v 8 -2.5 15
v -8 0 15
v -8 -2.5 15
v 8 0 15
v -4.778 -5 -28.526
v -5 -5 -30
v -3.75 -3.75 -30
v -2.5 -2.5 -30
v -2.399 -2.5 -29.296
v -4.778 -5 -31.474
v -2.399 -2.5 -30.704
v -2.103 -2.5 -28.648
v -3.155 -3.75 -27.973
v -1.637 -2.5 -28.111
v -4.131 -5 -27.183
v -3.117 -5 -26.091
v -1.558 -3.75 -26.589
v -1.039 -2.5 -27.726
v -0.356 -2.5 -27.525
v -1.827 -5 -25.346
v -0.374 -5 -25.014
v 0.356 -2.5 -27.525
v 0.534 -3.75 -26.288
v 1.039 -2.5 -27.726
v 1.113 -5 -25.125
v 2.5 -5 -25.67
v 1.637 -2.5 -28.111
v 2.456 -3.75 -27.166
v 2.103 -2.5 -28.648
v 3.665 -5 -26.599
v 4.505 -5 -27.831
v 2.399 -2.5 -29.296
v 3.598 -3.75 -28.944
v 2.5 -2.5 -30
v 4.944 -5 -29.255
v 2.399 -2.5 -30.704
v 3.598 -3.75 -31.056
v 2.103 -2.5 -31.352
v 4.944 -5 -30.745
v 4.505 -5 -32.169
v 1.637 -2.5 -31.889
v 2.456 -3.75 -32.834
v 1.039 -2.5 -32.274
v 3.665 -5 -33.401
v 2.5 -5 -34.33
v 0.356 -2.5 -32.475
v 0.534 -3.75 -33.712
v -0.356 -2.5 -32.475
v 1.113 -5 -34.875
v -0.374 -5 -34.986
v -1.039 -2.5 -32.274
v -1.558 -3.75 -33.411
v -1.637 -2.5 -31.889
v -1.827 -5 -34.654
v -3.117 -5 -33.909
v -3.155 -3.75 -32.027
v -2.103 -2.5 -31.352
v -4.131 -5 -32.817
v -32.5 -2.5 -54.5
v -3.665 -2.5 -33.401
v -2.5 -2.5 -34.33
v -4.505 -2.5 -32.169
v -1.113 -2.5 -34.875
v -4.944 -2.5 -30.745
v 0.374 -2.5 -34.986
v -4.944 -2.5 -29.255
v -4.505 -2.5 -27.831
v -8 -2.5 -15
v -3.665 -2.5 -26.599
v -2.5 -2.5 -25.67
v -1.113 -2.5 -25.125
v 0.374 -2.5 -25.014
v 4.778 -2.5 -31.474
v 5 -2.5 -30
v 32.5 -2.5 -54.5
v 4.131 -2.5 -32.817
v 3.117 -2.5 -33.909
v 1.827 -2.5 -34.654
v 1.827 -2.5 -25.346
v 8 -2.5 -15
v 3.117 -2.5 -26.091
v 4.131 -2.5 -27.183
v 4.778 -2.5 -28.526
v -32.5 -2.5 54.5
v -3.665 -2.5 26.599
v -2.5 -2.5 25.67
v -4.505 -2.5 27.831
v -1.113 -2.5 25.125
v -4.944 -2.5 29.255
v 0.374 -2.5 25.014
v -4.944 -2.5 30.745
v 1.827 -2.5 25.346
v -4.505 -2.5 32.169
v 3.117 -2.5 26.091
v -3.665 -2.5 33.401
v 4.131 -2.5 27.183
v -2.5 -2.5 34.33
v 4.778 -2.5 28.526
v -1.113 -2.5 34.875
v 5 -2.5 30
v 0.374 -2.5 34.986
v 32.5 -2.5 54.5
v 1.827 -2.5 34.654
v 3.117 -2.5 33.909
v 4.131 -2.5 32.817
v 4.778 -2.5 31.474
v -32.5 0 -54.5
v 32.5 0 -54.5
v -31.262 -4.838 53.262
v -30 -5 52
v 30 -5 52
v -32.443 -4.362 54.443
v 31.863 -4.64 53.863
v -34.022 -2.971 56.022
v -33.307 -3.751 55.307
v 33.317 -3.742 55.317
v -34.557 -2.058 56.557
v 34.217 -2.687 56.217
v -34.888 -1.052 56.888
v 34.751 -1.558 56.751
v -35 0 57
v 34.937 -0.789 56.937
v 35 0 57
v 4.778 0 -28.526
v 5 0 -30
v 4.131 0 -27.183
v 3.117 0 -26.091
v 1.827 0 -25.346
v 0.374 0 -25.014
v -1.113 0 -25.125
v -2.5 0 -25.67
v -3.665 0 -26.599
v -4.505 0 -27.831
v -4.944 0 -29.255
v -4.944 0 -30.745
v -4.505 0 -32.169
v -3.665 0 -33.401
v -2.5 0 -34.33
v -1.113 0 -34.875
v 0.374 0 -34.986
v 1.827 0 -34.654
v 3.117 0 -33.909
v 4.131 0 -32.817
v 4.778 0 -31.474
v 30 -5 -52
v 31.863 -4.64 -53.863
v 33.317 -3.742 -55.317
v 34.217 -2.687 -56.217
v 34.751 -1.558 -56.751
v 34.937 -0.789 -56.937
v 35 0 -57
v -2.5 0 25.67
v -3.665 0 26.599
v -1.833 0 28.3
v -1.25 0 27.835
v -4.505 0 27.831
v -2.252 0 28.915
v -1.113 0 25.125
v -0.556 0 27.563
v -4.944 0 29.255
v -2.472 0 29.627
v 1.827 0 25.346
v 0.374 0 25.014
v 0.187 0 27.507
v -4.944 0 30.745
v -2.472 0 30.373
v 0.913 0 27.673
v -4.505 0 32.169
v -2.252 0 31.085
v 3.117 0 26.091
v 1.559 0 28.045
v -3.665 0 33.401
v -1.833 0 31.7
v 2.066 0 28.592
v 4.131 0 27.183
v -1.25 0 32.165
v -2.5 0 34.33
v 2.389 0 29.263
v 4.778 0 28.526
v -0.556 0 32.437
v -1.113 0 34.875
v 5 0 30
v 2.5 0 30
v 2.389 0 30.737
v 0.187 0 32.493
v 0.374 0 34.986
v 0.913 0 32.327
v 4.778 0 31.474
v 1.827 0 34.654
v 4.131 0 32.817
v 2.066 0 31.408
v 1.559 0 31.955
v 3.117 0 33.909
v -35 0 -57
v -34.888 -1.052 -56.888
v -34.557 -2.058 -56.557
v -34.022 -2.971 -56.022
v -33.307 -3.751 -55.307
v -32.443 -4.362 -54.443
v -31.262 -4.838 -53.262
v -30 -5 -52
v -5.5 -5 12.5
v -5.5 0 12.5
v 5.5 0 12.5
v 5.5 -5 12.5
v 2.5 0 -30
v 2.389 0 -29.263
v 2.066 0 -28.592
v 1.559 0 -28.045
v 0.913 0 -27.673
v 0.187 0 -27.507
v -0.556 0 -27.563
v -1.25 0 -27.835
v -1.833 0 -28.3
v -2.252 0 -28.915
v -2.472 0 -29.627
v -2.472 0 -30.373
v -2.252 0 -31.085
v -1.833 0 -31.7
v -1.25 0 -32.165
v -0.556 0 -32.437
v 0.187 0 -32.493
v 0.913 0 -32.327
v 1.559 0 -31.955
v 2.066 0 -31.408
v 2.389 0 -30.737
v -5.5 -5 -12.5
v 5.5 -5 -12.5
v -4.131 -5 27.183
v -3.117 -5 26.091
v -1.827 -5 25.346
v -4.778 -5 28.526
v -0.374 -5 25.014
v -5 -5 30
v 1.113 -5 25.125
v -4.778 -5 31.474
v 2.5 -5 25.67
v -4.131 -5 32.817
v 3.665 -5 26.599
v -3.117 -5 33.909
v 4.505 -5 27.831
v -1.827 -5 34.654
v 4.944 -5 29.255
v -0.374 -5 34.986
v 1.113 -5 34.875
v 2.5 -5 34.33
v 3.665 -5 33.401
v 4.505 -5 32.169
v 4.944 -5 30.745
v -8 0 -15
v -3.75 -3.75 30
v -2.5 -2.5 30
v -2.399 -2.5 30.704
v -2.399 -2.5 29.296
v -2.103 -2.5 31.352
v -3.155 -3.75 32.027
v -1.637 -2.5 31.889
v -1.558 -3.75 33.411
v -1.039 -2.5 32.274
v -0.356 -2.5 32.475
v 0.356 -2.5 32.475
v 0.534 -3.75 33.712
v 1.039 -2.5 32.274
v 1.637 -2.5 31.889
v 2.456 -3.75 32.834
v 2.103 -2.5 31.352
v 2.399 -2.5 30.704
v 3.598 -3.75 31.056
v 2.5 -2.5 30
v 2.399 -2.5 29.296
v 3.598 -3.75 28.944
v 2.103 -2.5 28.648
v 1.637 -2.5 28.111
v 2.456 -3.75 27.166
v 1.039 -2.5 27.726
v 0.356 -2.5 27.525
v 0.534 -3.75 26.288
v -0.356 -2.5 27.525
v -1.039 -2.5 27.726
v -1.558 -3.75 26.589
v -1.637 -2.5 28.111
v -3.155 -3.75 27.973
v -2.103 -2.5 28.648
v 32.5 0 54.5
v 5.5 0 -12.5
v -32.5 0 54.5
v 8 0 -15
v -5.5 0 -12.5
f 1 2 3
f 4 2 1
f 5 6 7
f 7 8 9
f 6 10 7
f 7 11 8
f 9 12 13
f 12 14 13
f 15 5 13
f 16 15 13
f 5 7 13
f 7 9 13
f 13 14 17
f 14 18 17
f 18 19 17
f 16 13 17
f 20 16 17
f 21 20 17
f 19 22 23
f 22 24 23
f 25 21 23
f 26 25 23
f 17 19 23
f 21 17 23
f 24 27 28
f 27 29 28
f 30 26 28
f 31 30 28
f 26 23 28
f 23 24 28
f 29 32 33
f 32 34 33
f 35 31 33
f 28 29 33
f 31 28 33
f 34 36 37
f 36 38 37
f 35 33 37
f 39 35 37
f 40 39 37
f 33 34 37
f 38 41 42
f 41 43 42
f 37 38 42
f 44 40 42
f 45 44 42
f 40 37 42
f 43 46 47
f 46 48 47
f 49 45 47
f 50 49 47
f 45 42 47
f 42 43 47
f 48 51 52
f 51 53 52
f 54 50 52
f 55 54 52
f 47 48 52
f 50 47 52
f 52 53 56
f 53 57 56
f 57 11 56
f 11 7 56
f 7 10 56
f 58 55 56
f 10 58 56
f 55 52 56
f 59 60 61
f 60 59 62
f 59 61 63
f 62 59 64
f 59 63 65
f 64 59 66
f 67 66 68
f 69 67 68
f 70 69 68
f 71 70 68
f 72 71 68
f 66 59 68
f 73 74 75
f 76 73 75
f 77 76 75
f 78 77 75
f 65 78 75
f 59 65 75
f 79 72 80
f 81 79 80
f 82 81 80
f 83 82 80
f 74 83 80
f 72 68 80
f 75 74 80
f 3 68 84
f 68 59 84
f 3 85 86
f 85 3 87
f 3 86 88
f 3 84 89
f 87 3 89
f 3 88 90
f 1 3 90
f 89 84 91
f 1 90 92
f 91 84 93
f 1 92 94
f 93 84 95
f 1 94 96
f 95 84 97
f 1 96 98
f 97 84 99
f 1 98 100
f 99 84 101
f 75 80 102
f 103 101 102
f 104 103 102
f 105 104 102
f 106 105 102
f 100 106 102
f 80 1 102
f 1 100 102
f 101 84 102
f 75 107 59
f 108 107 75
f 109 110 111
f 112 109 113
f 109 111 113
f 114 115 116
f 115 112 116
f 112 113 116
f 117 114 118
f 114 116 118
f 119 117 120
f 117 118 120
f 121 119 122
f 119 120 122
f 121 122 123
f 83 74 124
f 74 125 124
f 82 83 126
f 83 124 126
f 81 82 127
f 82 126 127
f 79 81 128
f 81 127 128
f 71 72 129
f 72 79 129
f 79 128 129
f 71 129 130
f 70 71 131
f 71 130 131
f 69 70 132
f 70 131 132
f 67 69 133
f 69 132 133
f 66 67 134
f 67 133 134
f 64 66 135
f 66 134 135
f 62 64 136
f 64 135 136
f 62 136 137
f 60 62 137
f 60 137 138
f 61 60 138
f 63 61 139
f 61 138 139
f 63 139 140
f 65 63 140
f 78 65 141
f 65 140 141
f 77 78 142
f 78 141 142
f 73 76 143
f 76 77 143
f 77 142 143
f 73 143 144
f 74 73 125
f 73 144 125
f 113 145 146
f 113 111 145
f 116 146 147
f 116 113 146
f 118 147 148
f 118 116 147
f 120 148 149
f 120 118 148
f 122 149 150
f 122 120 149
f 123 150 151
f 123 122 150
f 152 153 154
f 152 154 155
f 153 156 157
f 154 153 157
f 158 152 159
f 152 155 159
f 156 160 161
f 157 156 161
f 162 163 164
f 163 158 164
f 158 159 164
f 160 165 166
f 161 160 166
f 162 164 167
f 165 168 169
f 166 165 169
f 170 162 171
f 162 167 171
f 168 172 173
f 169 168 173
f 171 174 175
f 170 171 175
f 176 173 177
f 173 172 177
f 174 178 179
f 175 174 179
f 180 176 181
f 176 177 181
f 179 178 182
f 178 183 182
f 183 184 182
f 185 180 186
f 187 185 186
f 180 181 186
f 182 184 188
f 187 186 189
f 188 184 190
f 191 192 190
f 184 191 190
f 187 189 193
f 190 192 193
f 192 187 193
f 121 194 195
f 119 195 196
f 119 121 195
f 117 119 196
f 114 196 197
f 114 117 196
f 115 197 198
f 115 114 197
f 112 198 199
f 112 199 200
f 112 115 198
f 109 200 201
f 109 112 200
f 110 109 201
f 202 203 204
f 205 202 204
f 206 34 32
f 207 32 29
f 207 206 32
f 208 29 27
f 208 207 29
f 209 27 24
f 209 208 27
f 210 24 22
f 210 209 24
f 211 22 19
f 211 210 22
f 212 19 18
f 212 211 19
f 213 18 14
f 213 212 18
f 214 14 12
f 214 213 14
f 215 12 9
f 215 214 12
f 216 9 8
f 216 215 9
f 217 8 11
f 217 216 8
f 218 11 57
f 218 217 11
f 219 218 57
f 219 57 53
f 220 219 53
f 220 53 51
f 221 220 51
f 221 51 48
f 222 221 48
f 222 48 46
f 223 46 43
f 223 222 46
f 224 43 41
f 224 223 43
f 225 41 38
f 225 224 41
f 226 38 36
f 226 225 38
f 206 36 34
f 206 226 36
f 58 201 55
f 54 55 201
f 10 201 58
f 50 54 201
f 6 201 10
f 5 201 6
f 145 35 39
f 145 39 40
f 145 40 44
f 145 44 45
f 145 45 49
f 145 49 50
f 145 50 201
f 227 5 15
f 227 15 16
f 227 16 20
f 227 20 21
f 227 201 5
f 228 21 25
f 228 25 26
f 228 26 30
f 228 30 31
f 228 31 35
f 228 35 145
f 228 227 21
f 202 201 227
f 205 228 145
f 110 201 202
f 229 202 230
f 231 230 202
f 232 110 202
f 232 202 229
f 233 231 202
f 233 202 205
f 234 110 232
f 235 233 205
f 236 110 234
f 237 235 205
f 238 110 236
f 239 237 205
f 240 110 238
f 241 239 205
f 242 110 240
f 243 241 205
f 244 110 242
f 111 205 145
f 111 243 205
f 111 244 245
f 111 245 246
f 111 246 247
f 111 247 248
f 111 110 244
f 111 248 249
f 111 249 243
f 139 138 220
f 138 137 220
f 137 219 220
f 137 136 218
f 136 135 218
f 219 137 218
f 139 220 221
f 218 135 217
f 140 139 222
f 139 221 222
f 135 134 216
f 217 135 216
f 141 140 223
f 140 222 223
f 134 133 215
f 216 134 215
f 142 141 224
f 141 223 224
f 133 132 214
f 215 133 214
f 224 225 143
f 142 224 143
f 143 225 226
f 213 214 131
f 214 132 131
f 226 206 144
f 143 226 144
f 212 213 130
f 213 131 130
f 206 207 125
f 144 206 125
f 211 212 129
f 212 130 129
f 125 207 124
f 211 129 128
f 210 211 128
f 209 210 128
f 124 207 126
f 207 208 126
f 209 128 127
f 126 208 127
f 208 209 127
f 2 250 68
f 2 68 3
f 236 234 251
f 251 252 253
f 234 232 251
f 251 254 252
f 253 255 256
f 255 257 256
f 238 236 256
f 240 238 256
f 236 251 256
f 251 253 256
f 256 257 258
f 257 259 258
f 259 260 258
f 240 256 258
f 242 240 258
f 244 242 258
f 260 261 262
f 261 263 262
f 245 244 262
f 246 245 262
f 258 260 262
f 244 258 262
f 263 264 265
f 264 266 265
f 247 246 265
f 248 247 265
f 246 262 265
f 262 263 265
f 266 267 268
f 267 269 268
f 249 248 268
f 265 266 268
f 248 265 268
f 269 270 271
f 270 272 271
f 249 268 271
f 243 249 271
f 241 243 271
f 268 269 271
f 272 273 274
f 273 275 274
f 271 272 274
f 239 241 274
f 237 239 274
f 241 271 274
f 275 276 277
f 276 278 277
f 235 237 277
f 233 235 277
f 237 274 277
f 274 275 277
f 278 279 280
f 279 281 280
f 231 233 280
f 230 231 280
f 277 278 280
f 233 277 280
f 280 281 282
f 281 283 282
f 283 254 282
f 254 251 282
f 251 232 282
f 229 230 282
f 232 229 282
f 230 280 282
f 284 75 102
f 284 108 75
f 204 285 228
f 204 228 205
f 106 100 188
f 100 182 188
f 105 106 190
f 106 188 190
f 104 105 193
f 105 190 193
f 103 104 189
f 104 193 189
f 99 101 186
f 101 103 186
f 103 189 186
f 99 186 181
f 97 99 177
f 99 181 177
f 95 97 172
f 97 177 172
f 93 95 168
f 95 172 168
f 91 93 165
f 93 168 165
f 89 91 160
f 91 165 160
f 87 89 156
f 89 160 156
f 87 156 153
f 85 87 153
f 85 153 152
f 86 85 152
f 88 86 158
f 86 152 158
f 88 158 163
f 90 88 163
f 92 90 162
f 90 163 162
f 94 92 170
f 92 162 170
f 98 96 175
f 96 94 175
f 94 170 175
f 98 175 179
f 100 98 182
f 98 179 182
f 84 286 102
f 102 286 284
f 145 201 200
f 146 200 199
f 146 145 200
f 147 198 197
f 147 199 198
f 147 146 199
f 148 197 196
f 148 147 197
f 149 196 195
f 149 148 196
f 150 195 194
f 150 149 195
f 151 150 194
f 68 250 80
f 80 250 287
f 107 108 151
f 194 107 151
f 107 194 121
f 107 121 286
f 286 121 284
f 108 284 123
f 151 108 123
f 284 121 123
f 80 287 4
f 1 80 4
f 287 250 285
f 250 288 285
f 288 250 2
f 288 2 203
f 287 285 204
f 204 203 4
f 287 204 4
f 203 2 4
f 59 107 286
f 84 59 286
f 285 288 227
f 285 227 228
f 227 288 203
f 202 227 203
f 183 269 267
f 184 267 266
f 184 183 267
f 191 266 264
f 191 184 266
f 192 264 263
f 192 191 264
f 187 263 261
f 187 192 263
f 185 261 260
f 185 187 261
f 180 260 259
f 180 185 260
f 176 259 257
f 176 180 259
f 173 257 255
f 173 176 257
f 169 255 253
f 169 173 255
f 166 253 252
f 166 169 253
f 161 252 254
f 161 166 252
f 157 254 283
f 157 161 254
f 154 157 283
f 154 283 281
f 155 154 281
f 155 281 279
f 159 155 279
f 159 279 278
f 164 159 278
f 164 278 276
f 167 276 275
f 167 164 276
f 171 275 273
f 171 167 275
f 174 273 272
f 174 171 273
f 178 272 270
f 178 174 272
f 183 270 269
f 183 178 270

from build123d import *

# Parameters (mm, degrees)
F0_W           = 70
F0_H           = 114
F0_R           = 2.5
F0_W_2         = 11
F0_H_2         = 25
F1_DEPTH       = 5
F2_T           = -2.5
F4_D           = 5
F4_CSINK_D     = 10
F4_CSINK_ANGLE = 90
F5_R           = 4.99999


# Not quite as in the source:
# - a fillet or chamfer is up to 0.001 mm smaller than in the source, because OpenCascade refuses the exact size


with BuildPart() as f1:
    # F0 (on Front) → F1 (new body)
    with BuildSketch(Plane.XZ):
        Rectangle(F0_W, F0_H)
        with Locations((0, -30)):
            Circle(F0_R, mode=Mode.SUBTRACT)
        Rectangle(F0_W_2, F0_H_2, mode=Mode.SUBTRACT)
        with Locations((0, 30)):
            Circle(F0_R, mode=Mode.SUBTRACT)
    extrude(amount=F1_DEPTH)

    # F2
    f2_openings = [f1.faces().sort_by_distance(p)[0] for p in [
        (0, 0, -55.662241),
    ]]
    offset(amount=F2_T, openings=f2_openings, kind=Kind.INTERSECTION)

    # F4 (through all)
    with Locations(Plane.XZ.offset(5)):
        with Locations((0, 30), (0, -30)):
            CounterSinkHole(F4_D / 2, F4_CSINK_D / 2, counter_sink_angle=F4_CSINK_ANGLE)

    # F5 (radius 5 in the source; OpenCascade refuses exactly that, so slightly less here)
    f5_edges = [f1.edges().sort_by_distance(p)[0] for p in [
        (-35, -5, 0),
        (0, -5, 57),
        (35, -5, 0),
        (0, -5, -57),
    ]]
    fillet(f5_edges, radius=F5_R)


solid = f1.part
